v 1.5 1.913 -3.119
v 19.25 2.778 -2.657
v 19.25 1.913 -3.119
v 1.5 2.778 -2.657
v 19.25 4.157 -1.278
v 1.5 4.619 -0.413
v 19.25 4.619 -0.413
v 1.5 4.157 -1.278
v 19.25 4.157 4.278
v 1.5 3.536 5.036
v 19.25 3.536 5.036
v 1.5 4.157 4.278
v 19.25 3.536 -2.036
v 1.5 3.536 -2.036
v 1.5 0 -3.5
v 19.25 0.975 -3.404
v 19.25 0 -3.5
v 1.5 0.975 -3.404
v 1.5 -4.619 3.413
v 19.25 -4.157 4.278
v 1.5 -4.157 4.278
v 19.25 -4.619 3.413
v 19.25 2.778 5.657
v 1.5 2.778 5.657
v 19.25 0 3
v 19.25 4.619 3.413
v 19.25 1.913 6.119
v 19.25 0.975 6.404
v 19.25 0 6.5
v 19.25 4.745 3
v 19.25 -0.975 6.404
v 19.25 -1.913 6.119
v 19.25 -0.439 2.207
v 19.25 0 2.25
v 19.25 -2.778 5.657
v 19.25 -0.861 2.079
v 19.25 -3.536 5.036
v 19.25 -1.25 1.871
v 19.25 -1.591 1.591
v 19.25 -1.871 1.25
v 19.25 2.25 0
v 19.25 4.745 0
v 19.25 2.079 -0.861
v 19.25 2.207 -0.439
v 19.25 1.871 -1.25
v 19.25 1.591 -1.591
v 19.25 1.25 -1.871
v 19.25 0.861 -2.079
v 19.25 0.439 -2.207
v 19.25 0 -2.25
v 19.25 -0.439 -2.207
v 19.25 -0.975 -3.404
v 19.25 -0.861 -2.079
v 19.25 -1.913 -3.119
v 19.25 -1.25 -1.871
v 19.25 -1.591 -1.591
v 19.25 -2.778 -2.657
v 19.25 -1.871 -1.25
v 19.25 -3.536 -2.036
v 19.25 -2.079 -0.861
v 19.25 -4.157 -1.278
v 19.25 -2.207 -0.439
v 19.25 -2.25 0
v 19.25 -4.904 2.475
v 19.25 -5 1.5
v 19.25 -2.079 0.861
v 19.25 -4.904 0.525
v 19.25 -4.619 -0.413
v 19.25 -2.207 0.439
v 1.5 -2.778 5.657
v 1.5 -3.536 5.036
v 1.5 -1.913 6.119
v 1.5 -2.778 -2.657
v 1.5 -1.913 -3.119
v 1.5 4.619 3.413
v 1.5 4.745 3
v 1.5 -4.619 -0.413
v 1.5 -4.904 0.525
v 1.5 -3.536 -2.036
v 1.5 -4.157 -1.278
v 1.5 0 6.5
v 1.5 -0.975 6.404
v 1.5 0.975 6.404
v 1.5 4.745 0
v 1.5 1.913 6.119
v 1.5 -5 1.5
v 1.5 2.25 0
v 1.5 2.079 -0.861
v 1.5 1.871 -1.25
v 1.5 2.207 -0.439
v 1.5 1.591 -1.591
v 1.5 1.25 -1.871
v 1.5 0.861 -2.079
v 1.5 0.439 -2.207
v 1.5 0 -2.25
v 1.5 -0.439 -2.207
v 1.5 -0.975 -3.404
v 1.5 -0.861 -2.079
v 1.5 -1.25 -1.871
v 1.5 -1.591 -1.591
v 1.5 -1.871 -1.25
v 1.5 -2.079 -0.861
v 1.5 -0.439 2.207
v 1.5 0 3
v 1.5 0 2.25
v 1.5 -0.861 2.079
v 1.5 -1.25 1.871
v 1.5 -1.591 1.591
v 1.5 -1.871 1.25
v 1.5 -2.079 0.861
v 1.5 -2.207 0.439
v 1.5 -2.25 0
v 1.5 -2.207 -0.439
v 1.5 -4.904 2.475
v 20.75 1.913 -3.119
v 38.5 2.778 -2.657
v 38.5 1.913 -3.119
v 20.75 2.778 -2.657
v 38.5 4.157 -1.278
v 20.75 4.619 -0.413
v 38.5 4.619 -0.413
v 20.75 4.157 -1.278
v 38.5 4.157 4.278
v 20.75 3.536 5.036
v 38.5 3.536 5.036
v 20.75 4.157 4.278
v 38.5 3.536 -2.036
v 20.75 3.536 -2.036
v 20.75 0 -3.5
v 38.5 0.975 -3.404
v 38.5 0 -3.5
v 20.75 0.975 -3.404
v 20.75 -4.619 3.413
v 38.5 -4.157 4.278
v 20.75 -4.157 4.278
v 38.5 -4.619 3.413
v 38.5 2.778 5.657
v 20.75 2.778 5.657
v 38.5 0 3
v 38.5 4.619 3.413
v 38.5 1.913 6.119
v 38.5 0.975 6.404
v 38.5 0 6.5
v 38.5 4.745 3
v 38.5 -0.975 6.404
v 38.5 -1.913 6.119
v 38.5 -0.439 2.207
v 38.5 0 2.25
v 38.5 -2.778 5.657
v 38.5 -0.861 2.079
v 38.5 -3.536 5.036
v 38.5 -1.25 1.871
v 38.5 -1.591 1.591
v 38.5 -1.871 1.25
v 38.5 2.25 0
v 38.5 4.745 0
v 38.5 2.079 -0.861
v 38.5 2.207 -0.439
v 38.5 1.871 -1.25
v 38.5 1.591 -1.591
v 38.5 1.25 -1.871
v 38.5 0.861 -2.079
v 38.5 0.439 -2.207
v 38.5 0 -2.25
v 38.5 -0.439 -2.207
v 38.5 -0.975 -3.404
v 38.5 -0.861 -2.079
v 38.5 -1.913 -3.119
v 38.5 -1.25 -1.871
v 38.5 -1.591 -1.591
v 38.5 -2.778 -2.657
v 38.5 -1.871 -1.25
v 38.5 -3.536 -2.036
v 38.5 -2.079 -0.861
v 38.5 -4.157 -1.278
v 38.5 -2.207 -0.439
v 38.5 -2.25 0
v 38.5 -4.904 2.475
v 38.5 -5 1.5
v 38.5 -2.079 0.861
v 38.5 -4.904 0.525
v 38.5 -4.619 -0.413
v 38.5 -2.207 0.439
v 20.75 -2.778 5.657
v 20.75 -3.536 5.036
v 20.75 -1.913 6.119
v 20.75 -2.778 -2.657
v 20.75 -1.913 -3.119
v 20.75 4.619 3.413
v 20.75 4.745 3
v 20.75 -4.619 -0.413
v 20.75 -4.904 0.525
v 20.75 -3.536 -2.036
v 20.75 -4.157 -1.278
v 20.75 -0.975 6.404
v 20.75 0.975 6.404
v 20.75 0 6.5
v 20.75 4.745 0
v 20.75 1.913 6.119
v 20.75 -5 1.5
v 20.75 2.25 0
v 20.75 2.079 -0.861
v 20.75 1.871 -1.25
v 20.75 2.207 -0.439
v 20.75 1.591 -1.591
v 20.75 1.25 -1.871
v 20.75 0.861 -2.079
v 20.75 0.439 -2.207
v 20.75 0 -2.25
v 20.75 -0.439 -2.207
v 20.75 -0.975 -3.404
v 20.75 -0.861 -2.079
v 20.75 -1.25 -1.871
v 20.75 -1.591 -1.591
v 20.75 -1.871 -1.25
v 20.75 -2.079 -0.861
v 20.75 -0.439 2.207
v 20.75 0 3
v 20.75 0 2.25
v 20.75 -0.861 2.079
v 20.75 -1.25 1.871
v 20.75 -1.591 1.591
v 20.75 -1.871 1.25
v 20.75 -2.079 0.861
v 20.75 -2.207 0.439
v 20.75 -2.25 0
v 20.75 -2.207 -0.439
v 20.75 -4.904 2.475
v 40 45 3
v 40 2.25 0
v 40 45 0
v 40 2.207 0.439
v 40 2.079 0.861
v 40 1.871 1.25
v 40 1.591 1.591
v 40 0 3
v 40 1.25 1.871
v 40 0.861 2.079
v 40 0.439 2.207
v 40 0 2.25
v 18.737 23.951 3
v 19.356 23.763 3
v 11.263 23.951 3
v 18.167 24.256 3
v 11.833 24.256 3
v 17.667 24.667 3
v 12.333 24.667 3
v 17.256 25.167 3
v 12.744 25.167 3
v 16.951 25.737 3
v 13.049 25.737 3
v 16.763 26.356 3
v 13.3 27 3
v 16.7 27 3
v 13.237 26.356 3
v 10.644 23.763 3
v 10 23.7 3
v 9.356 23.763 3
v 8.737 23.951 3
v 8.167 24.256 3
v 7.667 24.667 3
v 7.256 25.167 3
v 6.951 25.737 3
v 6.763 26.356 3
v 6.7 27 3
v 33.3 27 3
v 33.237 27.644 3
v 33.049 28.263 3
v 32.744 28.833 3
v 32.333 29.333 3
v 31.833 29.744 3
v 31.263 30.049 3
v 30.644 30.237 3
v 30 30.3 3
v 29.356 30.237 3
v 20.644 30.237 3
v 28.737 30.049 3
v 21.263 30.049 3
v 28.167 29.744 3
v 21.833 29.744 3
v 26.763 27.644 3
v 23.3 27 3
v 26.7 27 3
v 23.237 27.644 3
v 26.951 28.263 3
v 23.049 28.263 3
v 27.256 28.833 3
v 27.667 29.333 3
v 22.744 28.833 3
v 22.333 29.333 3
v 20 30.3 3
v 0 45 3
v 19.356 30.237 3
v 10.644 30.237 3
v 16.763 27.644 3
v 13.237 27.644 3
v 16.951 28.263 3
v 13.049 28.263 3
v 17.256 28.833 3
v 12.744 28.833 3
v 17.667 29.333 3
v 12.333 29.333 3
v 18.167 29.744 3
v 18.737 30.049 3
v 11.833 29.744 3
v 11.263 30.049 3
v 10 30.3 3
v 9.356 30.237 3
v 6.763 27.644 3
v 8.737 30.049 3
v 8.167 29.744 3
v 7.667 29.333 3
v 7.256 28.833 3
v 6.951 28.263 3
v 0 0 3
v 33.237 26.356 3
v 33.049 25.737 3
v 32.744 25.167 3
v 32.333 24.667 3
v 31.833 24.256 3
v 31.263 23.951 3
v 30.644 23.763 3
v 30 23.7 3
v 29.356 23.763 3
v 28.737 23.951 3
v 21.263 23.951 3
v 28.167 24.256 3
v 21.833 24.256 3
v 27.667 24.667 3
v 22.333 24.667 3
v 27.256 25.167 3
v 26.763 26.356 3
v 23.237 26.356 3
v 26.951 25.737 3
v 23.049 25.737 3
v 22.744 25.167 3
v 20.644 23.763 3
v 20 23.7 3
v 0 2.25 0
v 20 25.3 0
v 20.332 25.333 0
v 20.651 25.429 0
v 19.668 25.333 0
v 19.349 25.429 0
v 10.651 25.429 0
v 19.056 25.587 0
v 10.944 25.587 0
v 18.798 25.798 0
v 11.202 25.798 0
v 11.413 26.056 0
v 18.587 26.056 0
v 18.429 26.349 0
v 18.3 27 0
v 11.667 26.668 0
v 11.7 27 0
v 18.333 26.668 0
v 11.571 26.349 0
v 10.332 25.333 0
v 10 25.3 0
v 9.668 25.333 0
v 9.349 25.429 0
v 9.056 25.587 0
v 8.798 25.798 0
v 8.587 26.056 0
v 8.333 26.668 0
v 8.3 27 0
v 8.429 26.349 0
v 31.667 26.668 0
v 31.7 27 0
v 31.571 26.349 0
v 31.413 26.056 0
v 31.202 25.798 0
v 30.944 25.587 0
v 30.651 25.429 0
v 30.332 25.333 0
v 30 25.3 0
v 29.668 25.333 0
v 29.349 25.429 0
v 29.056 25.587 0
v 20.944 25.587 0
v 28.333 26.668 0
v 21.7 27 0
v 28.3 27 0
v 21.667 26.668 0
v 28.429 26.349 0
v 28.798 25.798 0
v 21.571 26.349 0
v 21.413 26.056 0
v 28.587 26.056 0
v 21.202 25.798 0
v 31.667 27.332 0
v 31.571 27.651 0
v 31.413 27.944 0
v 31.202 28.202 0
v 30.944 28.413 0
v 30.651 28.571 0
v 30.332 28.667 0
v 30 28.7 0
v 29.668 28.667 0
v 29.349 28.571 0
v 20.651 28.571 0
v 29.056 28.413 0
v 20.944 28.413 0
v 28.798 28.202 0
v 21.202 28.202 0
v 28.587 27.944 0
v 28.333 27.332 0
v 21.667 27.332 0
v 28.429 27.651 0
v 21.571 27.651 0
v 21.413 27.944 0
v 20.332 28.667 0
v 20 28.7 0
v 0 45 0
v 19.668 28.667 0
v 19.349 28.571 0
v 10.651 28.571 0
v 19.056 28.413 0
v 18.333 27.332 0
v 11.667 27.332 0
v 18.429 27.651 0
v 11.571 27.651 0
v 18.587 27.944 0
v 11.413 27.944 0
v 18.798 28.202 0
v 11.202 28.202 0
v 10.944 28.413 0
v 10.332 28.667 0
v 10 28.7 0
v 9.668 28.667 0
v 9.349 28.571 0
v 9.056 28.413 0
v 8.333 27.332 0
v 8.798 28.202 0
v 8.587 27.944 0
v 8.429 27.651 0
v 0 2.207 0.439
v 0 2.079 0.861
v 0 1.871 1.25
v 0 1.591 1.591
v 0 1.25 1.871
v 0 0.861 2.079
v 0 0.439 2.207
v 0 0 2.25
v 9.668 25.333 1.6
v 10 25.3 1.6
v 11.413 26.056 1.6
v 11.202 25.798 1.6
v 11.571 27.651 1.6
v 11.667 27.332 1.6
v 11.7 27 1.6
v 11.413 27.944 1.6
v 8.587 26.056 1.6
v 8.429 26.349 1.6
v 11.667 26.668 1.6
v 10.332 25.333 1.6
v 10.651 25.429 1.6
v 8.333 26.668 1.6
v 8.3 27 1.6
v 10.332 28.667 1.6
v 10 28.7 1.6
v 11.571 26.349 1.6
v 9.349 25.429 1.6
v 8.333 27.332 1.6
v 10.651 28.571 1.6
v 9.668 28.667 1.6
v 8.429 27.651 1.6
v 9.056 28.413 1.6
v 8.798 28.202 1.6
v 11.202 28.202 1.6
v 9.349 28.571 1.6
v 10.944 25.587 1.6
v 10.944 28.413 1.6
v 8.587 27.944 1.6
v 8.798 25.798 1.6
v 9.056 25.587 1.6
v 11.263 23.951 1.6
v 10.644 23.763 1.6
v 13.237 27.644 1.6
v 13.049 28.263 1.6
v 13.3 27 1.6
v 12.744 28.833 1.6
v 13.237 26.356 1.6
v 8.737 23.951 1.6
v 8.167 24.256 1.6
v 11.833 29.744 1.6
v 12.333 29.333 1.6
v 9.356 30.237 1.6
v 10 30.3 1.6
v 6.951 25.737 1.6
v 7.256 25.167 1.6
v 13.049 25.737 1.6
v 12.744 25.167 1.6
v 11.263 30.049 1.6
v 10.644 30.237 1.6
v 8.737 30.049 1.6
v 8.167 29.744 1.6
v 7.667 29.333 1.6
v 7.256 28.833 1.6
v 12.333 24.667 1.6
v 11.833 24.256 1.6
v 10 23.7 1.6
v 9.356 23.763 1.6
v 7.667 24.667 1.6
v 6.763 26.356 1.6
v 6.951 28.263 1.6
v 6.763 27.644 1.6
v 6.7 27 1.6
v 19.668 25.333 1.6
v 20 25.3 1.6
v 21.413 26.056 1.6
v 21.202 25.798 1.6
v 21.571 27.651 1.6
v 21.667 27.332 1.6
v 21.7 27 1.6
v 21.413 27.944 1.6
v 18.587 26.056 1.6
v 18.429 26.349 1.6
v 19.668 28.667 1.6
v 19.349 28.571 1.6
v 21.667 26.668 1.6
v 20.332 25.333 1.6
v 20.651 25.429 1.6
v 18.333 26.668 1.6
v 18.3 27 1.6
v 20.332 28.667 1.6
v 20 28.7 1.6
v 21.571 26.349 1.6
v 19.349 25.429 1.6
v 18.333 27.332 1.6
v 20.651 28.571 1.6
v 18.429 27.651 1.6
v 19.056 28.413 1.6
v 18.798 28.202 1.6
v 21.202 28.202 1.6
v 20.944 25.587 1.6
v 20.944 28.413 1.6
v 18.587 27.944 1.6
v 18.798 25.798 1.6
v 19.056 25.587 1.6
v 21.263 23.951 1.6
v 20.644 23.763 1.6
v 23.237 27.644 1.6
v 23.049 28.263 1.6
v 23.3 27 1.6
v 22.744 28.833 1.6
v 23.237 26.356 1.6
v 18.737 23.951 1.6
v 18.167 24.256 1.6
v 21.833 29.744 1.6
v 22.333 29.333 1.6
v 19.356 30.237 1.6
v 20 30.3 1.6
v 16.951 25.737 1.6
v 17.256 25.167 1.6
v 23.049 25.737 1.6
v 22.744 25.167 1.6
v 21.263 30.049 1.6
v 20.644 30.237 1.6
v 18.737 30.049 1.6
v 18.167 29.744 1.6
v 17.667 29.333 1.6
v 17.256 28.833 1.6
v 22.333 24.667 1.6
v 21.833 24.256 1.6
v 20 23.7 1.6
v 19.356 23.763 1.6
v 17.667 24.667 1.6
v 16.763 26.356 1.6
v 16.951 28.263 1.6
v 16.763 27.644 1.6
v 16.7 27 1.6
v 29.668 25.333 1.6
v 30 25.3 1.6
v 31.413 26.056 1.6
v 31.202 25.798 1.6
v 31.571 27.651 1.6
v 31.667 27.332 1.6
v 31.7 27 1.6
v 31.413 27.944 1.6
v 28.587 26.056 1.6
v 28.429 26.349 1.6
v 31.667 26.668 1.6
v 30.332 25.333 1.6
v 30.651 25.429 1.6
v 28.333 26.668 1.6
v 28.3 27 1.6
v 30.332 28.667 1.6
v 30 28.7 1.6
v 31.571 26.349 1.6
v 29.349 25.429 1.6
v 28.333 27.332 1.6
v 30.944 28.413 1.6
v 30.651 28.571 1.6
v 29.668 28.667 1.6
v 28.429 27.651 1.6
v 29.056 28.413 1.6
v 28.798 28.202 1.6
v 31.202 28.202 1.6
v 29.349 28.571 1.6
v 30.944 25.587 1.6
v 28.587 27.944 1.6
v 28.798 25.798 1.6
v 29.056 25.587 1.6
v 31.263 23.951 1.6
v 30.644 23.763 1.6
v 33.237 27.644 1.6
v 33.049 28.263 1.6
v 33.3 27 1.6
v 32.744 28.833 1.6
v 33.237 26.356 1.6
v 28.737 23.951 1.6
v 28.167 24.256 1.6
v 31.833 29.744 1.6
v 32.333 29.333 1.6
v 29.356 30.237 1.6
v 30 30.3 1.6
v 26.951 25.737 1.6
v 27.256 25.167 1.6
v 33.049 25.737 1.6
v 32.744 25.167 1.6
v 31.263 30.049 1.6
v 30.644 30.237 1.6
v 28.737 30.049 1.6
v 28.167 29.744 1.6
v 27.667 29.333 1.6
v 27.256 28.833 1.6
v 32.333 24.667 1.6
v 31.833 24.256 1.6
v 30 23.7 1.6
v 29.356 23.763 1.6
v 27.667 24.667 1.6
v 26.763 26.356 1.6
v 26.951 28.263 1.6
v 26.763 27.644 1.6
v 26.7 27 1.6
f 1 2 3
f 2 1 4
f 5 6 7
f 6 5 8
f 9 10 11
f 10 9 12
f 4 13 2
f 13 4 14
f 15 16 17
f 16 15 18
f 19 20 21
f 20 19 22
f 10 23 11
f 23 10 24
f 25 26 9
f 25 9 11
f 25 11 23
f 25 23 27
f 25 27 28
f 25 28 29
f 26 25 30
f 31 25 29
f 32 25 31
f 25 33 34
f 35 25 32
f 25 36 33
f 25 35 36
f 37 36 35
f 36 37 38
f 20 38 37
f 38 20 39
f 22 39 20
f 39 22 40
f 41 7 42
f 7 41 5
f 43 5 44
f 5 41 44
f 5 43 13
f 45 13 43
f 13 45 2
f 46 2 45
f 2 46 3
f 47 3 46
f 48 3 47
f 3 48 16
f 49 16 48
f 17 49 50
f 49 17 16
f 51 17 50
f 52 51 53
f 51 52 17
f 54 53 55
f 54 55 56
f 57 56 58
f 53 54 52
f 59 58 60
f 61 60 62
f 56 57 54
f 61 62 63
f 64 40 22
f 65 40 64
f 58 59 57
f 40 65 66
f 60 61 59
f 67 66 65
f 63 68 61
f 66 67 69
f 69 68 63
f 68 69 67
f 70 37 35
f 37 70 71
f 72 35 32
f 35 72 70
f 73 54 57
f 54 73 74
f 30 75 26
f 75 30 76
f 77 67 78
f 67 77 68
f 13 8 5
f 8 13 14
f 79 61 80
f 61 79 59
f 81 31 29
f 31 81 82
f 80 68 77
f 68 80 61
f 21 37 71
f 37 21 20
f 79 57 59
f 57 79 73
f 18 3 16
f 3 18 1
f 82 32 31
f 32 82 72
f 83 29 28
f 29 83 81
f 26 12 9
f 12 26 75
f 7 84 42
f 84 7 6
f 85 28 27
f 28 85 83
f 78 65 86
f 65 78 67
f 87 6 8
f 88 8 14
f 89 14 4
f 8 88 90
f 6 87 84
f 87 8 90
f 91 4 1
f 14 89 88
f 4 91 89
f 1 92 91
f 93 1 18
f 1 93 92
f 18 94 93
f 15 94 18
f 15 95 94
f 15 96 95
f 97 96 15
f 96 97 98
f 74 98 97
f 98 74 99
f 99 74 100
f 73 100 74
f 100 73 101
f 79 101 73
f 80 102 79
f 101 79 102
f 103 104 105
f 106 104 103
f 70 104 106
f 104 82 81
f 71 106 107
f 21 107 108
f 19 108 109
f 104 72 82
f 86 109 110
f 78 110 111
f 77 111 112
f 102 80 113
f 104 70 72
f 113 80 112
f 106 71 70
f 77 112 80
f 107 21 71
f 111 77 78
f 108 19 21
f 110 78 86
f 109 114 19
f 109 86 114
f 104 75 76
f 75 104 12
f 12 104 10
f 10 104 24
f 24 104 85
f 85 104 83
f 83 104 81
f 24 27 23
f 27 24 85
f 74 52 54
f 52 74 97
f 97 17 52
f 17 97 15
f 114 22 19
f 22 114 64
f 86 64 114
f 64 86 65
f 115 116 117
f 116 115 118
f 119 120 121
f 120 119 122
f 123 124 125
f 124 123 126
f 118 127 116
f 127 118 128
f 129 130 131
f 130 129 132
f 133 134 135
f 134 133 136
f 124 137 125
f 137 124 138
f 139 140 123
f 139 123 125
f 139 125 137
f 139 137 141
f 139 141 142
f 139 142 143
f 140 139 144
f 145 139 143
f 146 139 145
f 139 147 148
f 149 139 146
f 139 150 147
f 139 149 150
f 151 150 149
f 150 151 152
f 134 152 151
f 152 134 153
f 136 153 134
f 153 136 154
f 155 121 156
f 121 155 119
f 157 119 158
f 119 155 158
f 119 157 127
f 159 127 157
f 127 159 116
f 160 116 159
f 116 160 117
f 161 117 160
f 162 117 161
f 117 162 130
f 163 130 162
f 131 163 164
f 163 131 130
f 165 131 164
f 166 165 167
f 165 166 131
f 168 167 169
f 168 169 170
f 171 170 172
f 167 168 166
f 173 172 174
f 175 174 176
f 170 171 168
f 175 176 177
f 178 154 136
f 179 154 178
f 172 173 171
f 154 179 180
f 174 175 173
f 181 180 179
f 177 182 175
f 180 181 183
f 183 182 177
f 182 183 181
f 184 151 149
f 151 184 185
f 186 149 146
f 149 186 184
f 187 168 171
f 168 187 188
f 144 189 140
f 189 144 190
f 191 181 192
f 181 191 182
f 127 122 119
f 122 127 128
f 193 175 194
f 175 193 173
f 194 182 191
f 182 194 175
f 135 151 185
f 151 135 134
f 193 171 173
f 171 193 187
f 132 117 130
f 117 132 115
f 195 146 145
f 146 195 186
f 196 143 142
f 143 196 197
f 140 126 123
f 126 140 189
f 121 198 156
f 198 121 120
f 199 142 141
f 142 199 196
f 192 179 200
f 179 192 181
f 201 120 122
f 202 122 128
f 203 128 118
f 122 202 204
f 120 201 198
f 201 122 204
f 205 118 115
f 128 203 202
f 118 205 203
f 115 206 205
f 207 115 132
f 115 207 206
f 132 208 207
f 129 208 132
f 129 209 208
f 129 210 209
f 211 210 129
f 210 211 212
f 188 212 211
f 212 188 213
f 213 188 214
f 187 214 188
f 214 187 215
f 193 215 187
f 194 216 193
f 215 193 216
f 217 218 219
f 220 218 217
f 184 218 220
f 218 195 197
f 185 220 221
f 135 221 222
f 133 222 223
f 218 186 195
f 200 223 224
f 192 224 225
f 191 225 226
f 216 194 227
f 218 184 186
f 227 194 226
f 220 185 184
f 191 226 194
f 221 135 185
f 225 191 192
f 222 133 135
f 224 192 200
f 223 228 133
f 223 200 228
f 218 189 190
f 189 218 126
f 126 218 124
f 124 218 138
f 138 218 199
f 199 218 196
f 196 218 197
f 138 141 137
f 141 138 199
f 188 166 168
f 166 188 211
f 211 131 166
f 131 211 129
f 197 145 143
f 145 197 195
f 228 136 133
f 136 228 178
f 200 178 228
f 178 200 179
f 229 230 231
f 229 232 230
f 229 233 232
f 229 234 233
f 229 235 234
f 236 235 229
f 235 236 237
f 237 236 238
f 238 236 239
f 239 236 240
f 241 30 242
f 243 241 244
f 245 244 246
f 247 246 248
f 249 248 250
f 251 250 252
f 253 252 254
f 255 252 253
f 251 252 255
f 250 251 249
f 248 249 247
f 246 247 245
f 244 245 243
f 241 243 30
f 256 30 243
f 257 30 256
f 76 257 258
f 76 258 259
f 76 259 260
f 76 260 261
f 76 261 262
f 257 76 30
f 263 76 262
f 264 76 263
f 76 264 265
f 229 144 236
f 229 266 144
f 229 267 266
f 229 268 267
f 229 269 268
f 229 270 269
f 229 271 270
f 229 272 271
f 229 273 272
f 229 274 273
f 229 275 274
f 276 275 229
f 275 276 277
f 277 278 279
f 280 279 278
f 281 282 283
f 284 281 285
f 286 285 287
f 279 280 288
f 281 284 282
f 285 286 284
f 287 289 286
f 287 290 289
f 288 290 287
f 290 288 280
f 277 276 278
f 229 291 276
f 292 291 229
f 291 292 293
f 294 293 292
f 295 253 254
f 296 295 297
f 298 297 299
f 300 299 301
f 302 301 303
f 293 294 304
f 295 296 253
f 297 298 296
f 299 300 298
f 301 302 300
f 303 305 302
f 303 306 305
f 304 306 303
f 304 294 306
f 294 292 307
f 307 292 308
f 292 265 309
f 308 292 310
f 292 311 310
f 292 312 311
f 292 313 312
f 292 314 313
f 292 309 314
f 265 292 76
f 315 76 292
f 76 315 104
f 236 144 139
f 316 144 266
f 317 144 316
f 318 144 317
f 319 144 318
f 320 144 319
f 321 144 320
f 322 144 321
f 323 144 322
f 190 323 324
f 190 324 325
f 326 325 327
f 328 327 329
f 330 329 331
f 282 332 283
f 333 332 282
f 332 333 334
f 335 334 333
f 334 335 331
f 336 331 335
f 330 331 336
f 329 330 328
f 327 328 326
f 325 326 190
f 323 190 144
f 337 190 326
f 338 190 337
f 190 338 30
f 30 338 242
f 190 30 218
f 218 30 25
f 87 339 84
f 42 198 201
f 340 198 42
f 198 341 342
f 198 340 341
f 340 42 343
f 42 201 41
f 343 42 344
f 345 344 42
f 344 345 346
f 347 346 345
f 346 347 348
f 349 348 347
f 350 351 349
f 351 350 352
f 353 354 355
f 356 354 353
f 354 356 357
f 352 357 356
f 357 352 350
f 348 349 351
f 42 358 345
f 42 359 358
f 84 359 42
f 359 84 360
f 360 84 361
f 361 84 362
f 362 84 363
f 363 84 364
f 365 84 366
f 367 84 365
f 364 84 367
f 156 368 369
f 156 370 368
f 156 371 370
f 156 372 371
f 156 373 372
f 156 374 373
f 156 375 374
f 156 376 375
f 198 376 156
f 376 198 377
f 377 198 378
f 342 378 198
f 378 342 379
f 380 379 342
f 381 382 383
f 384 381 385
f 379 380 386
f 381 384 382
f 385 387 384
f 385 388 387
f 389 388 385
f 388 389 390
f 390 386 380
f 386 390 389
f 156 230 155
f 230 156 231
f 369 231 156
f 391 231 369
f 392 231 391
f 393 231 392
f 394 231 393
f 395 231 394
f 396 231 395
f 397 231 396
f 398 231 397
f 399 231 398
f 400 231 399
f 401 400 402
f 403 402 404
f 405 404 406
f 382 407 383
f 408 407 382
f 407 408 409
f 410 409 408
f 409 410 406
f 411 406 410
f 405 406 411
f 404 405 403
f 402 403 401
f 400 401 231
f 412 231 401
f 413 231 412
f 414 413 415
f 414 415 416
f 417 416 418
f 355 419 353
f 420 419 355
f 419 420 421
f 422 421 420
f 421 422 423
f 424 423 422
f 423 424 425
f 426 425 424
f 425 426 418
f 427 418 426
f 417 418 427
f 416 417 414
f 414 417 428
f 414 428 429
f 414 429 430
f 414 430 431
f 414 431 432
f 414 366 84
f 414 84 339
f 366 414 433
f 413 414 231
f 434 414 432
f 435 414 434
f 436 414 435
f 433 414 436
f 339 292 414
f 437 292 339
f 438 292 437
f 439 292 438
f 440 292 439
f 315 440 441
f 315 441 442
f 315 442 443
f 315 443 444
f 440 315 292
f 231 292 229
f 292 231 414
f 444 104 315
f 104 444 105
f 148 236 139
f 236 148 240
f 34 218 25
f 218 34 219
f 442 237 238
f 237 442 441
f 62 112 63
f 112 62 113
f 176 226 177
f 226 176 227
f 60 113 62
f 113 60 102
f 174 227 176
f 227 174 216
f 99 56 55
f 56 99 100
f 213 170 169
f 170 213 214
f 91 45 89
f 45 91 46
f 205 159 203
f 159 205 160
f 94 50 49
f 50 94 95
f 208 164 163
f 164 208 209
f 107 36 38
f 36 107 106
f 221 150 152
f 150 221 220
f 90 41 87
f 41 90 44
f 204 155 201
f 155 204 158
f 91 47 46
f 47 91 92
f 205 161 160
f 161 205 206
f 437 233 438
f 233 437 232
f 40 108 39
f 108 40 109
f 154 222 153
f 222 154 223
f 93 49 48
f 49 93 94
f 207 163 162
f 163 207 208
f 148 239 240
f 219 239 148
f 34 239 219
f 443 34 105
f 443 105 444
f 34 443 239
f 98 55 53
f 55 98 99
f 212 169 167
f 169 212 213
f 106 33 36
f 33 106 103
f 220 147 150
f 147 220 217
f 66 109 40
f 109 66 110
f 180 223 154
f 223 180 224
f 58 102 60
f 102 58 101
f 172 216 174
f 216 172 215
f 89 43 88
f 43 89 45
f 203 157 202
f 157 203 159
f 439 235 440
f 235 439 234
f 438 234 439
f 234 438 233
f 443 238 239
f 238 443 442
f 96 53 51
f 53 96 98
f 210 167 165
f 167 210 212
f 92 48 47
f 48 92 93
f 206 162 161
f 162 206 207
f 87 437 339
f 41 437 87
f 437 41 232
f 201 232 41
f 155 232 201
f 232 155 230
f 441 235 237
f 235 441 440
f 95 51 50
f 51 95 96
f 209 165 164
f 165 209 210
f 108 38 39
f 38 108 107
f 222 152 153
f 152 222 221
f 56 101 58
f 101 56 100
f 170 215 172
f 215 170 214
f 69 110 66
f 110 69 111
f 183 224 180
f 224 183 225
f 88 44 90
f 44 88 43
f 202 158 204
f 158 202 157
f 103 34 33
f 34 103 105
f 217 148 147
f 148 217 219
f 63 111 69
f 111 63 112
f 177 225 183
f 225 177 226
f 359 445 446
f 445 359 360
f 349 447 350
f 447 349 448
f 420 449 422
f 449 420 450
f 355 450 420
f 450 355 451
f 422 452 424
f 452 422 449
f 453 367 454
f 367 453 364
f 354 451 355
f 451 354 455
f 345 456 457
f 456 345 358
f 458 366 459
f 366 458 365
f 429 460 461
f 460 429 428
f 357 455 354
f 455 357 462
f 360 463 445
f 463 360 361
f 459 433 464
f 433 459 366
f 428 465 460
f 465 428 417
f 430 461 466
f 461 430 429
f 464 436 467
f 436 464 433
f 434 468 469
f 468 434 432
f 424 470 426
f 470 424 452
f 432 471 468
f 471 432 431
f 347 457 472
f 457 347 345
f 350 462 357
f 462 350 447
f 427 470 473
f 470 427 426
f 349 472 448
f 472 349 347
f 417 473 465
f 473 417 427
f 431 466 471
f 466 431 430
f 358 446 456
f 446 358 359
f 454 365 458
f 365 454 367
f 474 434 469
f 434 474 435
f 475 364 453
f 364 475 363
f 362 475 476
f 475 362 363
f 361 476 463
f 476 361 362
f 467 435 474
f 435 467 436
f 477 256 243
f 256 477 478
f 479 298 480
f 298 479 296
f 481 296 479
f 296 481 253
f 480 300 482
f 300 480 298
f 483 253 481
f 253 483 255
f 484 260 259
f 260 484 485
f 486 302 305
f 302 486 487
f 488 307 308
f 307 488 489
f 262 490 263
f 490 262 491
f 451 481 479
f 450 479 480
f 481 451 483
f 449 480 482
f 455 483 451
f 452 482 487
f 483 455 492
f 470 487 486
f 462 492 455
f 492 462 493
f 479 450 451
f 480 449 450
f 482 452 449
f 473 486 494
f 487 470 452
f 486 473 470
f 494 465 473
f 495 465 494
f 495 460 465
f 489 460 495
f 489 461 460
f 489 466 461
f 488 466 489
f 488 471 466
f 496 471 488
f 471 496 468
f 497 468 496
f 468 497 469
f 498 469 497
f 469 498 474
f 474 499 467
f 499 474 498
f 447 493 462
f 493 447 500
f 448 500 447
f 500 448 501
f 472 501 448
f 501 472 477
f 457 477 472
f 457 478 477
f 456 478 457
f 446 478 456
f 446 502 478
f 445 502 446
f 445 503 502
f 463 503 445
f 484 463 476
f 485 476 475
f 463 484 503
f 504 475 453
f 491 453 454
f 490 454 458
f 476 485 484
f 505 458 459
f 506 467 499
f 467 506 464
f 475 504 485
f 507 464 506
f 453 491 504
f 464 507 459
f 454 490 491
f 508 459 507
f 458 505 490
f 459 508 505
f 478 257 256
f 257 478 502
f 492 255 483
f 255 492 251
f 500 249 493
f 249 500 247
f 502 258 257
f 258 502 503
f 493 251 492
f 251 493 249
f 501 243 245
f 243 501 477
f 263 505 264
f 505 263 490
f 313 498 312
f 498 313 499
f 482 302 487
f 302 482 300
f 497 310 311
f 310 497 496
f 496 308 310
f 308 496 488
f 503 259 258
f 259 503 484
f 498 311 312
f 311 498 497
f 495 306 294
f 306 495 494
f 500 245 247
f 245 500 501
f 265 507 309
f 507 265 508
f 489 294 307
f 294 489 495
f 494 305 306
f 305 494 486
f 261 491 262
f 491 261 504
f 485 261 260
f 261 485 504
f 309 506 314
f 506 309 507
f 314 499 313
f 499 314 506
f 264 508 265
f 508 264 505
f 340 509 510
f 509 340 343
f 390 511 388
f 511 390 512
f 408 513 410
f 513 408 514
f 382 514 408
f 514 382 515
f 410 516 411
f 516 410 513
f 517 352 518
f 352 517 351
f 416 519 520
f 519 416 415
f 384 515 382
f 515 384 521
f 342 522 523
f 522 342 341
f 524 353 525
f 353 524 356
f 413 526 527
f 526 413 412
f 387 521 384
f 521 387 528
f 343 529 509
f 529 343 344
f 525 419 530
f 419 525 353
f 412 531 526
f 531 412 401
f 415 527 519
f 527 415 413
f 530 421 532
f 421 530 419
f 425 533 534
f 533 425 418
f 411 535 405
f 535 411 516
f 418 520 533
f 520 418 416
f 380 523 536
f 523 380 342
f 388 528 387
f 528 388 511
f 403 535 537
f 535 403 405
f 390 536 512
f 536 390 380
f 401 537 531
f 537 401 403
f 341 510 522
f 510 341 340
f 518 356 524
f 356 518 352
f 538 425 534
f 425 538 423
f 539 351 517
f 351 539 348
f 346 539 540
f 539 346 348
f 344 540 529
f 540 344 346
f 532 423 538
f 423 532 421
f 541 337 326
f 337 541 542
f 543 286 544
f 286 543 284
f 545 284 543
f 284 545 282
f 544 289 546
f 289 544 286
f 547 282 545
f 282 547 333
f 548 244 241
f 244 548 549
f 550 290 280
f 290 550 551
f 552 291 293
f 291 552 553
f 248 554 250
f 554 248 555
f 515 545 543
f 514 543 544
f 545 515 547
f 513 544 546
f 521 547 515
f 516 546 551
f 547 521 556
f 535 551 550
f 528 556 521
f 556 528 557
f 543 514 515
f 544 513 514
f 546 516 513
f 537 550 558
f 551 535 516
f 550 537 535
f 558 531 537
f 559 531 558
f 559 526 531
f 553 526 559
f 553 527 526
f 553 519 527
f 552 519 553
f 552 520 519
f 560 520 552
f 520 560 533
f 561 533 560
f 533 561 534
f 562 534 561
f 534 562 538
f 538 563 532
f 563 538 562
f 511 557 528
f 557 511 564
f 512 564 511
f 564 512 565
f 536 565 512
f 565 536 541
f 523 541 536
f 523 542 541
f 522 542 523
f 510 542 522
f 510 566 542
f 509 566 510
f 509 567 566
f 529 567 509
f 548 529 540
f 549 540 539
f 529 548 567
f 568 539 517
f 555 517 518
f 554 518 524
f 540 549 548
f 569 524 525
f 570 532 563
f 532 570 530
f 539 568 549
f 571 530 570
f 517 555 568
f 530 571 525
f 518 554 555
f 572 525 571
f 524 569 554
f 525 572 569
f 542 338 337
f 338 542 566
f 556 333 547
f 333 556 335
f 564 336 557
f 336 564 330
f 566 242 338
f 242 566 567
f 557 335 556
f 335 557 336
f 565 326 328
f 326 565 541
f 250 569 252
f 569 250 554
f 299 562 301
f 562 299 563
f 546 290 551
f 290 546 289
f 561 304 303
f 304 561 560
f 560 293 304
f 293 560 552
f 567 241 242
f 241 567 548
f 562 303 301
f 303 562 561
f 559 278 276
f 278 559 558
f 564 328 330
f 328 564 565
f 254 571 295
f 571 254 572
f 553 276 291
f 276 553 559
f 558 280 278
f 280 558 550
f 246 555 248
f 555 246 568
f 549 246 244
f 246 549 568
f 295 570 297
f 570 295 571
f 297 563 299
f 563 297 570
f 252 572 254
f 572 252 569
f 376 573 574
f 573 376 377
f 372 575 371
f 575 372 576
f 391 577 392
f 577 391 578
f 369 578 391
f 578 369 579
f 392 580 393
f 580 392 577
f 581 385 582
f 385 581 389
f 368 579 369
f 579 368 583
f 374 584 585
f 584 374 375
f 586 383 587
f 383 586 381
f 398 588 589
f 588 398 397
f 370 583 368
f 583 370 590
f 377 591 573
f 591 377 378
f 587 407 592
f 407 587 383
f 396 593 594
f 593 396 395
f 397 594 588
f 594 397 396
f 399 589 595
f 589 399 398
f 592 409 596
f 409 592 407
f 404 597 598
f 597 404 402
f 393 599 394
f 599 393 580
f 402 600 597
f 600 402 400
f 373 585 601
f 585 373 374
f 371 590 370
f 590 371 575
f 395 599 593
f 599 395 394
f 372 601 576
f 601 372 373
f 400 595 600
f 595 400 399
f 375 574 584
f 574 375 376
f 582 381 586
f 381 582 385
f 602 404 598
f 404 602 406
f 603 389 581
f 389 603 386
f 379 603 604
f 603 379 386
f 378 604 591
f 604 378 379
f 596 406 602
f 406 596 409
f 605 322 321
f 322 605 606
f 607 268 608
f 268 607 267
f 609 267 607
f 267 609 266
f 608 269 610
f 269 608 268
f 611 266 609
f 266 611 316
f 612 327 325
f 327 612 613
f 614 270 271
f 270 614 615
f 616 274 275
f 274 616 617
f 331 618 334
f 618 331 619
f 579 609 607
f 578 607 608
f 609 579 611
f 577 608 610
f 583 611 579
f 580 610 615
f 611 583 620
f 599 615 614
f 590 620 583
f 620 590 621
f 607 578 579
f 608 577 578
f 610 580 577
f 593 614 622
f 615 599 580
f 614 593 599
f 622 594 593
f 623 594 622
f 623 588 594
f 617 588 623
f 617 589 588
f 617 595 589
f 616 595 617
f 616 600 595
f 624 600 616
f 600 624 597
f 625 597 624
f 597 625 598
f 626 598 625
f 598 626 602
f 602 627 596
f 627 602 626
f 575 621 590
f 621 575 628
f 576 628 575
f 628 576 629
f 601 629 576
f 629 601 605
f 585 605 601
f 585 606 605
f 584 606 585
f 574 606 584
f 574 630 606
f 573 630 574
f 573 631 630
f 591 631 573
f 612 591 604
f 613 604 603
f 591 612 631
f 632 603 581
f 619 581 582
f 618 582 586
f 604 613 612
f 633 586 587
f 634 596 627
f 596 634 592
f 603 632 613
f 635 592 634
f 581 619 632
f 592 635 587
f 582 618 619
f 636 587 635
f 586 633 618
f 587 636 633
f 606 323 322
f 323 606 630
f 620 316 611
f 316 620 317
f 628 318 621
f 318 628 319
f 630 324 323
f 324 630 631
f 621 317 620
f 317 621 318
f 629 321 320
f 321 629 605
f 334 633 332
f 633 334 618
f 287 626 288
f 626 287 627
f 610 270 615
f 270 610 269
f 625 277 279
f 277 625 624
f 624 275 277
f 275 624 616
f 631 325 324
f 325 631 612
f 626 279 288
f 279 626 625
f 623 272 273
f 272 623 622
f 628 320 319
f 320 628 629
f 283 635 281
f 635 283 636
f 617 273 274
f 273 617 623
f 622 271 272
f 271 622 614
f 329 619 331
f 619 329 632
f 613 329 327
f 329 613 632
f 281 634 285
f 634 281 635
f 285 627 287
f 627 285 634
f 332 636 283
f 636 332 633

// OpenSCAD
$fn = 32;

// ----------------------------------------------------------------------
// Hinge leaf: 40 x 50 x 10 mm
// ----------------------------------------------------------------------

// --- parameters (mm) ---
leaf_len = 40;            // leaf length, X
leaf_w = 45;              // leaf width, Y
leaf_t = 3;               // leaf thickness
knuckle_d = 10;           // knuckle diameter
knuckle_w = 17.75;        // knuckle width
knuckle_n = 2;            // number of knuckles
pin_d = 4.5;              // pin bore
gap = 1.5;                // gap between the knuckles
screw_d = 3.4;            // screw clearance
cs_d = 6.6;               // countersink diameter
cs_h = 1.4;               // countersink depth

module leaf() {
  cube([leaf_len, leaf_w, leaf_t]);
}

module knuckles() {
  /* barrels sit on the leaf edge, the pin axis at half the leaf thickness */
  for (i = [0 : knuckle_n - 1])
    translate([gap + i * (knuckle_w + gap), 0, leaf_t * 0.5])
      rotate([0, 90, 0]) cylinder(h = knuckle_w, d = knuckle_d);
}

difference() {
  union() {
    leaf();
    knuckles();
  }
  rotate([0, 90, 0]) translate([0, 0, -1])
    cylinder(h = leaf_len + 2, d = pin_d);
  translate([10, leaf_w * 0.6, -1]) cylinder(h = leaf_t + 2, d = screw_d);
  translate([10, leaf_w * 0.6, leaf_t - cs_h]) cylinder(h = cs_h + 0.5, d = cs_d);
  translate([20, leaf_w * 0.6, -1]) cylinder(h = leaf_t + 2, d = screw_d);
  translate([20, leaf_w * 0.6, leaf_t - cs_h]) cylinder(h = cs_h + 0.5, d = cs_d);
  translate([30, leaf_w * 0.6, -1]) cylinder(h = leaf_t + 2, d = screw_d);
  translate([30, leaf_w * 0.6, leaf_t - cs_h]) cylinder(h = cs_h + 0.5, d = cs_d);
}
